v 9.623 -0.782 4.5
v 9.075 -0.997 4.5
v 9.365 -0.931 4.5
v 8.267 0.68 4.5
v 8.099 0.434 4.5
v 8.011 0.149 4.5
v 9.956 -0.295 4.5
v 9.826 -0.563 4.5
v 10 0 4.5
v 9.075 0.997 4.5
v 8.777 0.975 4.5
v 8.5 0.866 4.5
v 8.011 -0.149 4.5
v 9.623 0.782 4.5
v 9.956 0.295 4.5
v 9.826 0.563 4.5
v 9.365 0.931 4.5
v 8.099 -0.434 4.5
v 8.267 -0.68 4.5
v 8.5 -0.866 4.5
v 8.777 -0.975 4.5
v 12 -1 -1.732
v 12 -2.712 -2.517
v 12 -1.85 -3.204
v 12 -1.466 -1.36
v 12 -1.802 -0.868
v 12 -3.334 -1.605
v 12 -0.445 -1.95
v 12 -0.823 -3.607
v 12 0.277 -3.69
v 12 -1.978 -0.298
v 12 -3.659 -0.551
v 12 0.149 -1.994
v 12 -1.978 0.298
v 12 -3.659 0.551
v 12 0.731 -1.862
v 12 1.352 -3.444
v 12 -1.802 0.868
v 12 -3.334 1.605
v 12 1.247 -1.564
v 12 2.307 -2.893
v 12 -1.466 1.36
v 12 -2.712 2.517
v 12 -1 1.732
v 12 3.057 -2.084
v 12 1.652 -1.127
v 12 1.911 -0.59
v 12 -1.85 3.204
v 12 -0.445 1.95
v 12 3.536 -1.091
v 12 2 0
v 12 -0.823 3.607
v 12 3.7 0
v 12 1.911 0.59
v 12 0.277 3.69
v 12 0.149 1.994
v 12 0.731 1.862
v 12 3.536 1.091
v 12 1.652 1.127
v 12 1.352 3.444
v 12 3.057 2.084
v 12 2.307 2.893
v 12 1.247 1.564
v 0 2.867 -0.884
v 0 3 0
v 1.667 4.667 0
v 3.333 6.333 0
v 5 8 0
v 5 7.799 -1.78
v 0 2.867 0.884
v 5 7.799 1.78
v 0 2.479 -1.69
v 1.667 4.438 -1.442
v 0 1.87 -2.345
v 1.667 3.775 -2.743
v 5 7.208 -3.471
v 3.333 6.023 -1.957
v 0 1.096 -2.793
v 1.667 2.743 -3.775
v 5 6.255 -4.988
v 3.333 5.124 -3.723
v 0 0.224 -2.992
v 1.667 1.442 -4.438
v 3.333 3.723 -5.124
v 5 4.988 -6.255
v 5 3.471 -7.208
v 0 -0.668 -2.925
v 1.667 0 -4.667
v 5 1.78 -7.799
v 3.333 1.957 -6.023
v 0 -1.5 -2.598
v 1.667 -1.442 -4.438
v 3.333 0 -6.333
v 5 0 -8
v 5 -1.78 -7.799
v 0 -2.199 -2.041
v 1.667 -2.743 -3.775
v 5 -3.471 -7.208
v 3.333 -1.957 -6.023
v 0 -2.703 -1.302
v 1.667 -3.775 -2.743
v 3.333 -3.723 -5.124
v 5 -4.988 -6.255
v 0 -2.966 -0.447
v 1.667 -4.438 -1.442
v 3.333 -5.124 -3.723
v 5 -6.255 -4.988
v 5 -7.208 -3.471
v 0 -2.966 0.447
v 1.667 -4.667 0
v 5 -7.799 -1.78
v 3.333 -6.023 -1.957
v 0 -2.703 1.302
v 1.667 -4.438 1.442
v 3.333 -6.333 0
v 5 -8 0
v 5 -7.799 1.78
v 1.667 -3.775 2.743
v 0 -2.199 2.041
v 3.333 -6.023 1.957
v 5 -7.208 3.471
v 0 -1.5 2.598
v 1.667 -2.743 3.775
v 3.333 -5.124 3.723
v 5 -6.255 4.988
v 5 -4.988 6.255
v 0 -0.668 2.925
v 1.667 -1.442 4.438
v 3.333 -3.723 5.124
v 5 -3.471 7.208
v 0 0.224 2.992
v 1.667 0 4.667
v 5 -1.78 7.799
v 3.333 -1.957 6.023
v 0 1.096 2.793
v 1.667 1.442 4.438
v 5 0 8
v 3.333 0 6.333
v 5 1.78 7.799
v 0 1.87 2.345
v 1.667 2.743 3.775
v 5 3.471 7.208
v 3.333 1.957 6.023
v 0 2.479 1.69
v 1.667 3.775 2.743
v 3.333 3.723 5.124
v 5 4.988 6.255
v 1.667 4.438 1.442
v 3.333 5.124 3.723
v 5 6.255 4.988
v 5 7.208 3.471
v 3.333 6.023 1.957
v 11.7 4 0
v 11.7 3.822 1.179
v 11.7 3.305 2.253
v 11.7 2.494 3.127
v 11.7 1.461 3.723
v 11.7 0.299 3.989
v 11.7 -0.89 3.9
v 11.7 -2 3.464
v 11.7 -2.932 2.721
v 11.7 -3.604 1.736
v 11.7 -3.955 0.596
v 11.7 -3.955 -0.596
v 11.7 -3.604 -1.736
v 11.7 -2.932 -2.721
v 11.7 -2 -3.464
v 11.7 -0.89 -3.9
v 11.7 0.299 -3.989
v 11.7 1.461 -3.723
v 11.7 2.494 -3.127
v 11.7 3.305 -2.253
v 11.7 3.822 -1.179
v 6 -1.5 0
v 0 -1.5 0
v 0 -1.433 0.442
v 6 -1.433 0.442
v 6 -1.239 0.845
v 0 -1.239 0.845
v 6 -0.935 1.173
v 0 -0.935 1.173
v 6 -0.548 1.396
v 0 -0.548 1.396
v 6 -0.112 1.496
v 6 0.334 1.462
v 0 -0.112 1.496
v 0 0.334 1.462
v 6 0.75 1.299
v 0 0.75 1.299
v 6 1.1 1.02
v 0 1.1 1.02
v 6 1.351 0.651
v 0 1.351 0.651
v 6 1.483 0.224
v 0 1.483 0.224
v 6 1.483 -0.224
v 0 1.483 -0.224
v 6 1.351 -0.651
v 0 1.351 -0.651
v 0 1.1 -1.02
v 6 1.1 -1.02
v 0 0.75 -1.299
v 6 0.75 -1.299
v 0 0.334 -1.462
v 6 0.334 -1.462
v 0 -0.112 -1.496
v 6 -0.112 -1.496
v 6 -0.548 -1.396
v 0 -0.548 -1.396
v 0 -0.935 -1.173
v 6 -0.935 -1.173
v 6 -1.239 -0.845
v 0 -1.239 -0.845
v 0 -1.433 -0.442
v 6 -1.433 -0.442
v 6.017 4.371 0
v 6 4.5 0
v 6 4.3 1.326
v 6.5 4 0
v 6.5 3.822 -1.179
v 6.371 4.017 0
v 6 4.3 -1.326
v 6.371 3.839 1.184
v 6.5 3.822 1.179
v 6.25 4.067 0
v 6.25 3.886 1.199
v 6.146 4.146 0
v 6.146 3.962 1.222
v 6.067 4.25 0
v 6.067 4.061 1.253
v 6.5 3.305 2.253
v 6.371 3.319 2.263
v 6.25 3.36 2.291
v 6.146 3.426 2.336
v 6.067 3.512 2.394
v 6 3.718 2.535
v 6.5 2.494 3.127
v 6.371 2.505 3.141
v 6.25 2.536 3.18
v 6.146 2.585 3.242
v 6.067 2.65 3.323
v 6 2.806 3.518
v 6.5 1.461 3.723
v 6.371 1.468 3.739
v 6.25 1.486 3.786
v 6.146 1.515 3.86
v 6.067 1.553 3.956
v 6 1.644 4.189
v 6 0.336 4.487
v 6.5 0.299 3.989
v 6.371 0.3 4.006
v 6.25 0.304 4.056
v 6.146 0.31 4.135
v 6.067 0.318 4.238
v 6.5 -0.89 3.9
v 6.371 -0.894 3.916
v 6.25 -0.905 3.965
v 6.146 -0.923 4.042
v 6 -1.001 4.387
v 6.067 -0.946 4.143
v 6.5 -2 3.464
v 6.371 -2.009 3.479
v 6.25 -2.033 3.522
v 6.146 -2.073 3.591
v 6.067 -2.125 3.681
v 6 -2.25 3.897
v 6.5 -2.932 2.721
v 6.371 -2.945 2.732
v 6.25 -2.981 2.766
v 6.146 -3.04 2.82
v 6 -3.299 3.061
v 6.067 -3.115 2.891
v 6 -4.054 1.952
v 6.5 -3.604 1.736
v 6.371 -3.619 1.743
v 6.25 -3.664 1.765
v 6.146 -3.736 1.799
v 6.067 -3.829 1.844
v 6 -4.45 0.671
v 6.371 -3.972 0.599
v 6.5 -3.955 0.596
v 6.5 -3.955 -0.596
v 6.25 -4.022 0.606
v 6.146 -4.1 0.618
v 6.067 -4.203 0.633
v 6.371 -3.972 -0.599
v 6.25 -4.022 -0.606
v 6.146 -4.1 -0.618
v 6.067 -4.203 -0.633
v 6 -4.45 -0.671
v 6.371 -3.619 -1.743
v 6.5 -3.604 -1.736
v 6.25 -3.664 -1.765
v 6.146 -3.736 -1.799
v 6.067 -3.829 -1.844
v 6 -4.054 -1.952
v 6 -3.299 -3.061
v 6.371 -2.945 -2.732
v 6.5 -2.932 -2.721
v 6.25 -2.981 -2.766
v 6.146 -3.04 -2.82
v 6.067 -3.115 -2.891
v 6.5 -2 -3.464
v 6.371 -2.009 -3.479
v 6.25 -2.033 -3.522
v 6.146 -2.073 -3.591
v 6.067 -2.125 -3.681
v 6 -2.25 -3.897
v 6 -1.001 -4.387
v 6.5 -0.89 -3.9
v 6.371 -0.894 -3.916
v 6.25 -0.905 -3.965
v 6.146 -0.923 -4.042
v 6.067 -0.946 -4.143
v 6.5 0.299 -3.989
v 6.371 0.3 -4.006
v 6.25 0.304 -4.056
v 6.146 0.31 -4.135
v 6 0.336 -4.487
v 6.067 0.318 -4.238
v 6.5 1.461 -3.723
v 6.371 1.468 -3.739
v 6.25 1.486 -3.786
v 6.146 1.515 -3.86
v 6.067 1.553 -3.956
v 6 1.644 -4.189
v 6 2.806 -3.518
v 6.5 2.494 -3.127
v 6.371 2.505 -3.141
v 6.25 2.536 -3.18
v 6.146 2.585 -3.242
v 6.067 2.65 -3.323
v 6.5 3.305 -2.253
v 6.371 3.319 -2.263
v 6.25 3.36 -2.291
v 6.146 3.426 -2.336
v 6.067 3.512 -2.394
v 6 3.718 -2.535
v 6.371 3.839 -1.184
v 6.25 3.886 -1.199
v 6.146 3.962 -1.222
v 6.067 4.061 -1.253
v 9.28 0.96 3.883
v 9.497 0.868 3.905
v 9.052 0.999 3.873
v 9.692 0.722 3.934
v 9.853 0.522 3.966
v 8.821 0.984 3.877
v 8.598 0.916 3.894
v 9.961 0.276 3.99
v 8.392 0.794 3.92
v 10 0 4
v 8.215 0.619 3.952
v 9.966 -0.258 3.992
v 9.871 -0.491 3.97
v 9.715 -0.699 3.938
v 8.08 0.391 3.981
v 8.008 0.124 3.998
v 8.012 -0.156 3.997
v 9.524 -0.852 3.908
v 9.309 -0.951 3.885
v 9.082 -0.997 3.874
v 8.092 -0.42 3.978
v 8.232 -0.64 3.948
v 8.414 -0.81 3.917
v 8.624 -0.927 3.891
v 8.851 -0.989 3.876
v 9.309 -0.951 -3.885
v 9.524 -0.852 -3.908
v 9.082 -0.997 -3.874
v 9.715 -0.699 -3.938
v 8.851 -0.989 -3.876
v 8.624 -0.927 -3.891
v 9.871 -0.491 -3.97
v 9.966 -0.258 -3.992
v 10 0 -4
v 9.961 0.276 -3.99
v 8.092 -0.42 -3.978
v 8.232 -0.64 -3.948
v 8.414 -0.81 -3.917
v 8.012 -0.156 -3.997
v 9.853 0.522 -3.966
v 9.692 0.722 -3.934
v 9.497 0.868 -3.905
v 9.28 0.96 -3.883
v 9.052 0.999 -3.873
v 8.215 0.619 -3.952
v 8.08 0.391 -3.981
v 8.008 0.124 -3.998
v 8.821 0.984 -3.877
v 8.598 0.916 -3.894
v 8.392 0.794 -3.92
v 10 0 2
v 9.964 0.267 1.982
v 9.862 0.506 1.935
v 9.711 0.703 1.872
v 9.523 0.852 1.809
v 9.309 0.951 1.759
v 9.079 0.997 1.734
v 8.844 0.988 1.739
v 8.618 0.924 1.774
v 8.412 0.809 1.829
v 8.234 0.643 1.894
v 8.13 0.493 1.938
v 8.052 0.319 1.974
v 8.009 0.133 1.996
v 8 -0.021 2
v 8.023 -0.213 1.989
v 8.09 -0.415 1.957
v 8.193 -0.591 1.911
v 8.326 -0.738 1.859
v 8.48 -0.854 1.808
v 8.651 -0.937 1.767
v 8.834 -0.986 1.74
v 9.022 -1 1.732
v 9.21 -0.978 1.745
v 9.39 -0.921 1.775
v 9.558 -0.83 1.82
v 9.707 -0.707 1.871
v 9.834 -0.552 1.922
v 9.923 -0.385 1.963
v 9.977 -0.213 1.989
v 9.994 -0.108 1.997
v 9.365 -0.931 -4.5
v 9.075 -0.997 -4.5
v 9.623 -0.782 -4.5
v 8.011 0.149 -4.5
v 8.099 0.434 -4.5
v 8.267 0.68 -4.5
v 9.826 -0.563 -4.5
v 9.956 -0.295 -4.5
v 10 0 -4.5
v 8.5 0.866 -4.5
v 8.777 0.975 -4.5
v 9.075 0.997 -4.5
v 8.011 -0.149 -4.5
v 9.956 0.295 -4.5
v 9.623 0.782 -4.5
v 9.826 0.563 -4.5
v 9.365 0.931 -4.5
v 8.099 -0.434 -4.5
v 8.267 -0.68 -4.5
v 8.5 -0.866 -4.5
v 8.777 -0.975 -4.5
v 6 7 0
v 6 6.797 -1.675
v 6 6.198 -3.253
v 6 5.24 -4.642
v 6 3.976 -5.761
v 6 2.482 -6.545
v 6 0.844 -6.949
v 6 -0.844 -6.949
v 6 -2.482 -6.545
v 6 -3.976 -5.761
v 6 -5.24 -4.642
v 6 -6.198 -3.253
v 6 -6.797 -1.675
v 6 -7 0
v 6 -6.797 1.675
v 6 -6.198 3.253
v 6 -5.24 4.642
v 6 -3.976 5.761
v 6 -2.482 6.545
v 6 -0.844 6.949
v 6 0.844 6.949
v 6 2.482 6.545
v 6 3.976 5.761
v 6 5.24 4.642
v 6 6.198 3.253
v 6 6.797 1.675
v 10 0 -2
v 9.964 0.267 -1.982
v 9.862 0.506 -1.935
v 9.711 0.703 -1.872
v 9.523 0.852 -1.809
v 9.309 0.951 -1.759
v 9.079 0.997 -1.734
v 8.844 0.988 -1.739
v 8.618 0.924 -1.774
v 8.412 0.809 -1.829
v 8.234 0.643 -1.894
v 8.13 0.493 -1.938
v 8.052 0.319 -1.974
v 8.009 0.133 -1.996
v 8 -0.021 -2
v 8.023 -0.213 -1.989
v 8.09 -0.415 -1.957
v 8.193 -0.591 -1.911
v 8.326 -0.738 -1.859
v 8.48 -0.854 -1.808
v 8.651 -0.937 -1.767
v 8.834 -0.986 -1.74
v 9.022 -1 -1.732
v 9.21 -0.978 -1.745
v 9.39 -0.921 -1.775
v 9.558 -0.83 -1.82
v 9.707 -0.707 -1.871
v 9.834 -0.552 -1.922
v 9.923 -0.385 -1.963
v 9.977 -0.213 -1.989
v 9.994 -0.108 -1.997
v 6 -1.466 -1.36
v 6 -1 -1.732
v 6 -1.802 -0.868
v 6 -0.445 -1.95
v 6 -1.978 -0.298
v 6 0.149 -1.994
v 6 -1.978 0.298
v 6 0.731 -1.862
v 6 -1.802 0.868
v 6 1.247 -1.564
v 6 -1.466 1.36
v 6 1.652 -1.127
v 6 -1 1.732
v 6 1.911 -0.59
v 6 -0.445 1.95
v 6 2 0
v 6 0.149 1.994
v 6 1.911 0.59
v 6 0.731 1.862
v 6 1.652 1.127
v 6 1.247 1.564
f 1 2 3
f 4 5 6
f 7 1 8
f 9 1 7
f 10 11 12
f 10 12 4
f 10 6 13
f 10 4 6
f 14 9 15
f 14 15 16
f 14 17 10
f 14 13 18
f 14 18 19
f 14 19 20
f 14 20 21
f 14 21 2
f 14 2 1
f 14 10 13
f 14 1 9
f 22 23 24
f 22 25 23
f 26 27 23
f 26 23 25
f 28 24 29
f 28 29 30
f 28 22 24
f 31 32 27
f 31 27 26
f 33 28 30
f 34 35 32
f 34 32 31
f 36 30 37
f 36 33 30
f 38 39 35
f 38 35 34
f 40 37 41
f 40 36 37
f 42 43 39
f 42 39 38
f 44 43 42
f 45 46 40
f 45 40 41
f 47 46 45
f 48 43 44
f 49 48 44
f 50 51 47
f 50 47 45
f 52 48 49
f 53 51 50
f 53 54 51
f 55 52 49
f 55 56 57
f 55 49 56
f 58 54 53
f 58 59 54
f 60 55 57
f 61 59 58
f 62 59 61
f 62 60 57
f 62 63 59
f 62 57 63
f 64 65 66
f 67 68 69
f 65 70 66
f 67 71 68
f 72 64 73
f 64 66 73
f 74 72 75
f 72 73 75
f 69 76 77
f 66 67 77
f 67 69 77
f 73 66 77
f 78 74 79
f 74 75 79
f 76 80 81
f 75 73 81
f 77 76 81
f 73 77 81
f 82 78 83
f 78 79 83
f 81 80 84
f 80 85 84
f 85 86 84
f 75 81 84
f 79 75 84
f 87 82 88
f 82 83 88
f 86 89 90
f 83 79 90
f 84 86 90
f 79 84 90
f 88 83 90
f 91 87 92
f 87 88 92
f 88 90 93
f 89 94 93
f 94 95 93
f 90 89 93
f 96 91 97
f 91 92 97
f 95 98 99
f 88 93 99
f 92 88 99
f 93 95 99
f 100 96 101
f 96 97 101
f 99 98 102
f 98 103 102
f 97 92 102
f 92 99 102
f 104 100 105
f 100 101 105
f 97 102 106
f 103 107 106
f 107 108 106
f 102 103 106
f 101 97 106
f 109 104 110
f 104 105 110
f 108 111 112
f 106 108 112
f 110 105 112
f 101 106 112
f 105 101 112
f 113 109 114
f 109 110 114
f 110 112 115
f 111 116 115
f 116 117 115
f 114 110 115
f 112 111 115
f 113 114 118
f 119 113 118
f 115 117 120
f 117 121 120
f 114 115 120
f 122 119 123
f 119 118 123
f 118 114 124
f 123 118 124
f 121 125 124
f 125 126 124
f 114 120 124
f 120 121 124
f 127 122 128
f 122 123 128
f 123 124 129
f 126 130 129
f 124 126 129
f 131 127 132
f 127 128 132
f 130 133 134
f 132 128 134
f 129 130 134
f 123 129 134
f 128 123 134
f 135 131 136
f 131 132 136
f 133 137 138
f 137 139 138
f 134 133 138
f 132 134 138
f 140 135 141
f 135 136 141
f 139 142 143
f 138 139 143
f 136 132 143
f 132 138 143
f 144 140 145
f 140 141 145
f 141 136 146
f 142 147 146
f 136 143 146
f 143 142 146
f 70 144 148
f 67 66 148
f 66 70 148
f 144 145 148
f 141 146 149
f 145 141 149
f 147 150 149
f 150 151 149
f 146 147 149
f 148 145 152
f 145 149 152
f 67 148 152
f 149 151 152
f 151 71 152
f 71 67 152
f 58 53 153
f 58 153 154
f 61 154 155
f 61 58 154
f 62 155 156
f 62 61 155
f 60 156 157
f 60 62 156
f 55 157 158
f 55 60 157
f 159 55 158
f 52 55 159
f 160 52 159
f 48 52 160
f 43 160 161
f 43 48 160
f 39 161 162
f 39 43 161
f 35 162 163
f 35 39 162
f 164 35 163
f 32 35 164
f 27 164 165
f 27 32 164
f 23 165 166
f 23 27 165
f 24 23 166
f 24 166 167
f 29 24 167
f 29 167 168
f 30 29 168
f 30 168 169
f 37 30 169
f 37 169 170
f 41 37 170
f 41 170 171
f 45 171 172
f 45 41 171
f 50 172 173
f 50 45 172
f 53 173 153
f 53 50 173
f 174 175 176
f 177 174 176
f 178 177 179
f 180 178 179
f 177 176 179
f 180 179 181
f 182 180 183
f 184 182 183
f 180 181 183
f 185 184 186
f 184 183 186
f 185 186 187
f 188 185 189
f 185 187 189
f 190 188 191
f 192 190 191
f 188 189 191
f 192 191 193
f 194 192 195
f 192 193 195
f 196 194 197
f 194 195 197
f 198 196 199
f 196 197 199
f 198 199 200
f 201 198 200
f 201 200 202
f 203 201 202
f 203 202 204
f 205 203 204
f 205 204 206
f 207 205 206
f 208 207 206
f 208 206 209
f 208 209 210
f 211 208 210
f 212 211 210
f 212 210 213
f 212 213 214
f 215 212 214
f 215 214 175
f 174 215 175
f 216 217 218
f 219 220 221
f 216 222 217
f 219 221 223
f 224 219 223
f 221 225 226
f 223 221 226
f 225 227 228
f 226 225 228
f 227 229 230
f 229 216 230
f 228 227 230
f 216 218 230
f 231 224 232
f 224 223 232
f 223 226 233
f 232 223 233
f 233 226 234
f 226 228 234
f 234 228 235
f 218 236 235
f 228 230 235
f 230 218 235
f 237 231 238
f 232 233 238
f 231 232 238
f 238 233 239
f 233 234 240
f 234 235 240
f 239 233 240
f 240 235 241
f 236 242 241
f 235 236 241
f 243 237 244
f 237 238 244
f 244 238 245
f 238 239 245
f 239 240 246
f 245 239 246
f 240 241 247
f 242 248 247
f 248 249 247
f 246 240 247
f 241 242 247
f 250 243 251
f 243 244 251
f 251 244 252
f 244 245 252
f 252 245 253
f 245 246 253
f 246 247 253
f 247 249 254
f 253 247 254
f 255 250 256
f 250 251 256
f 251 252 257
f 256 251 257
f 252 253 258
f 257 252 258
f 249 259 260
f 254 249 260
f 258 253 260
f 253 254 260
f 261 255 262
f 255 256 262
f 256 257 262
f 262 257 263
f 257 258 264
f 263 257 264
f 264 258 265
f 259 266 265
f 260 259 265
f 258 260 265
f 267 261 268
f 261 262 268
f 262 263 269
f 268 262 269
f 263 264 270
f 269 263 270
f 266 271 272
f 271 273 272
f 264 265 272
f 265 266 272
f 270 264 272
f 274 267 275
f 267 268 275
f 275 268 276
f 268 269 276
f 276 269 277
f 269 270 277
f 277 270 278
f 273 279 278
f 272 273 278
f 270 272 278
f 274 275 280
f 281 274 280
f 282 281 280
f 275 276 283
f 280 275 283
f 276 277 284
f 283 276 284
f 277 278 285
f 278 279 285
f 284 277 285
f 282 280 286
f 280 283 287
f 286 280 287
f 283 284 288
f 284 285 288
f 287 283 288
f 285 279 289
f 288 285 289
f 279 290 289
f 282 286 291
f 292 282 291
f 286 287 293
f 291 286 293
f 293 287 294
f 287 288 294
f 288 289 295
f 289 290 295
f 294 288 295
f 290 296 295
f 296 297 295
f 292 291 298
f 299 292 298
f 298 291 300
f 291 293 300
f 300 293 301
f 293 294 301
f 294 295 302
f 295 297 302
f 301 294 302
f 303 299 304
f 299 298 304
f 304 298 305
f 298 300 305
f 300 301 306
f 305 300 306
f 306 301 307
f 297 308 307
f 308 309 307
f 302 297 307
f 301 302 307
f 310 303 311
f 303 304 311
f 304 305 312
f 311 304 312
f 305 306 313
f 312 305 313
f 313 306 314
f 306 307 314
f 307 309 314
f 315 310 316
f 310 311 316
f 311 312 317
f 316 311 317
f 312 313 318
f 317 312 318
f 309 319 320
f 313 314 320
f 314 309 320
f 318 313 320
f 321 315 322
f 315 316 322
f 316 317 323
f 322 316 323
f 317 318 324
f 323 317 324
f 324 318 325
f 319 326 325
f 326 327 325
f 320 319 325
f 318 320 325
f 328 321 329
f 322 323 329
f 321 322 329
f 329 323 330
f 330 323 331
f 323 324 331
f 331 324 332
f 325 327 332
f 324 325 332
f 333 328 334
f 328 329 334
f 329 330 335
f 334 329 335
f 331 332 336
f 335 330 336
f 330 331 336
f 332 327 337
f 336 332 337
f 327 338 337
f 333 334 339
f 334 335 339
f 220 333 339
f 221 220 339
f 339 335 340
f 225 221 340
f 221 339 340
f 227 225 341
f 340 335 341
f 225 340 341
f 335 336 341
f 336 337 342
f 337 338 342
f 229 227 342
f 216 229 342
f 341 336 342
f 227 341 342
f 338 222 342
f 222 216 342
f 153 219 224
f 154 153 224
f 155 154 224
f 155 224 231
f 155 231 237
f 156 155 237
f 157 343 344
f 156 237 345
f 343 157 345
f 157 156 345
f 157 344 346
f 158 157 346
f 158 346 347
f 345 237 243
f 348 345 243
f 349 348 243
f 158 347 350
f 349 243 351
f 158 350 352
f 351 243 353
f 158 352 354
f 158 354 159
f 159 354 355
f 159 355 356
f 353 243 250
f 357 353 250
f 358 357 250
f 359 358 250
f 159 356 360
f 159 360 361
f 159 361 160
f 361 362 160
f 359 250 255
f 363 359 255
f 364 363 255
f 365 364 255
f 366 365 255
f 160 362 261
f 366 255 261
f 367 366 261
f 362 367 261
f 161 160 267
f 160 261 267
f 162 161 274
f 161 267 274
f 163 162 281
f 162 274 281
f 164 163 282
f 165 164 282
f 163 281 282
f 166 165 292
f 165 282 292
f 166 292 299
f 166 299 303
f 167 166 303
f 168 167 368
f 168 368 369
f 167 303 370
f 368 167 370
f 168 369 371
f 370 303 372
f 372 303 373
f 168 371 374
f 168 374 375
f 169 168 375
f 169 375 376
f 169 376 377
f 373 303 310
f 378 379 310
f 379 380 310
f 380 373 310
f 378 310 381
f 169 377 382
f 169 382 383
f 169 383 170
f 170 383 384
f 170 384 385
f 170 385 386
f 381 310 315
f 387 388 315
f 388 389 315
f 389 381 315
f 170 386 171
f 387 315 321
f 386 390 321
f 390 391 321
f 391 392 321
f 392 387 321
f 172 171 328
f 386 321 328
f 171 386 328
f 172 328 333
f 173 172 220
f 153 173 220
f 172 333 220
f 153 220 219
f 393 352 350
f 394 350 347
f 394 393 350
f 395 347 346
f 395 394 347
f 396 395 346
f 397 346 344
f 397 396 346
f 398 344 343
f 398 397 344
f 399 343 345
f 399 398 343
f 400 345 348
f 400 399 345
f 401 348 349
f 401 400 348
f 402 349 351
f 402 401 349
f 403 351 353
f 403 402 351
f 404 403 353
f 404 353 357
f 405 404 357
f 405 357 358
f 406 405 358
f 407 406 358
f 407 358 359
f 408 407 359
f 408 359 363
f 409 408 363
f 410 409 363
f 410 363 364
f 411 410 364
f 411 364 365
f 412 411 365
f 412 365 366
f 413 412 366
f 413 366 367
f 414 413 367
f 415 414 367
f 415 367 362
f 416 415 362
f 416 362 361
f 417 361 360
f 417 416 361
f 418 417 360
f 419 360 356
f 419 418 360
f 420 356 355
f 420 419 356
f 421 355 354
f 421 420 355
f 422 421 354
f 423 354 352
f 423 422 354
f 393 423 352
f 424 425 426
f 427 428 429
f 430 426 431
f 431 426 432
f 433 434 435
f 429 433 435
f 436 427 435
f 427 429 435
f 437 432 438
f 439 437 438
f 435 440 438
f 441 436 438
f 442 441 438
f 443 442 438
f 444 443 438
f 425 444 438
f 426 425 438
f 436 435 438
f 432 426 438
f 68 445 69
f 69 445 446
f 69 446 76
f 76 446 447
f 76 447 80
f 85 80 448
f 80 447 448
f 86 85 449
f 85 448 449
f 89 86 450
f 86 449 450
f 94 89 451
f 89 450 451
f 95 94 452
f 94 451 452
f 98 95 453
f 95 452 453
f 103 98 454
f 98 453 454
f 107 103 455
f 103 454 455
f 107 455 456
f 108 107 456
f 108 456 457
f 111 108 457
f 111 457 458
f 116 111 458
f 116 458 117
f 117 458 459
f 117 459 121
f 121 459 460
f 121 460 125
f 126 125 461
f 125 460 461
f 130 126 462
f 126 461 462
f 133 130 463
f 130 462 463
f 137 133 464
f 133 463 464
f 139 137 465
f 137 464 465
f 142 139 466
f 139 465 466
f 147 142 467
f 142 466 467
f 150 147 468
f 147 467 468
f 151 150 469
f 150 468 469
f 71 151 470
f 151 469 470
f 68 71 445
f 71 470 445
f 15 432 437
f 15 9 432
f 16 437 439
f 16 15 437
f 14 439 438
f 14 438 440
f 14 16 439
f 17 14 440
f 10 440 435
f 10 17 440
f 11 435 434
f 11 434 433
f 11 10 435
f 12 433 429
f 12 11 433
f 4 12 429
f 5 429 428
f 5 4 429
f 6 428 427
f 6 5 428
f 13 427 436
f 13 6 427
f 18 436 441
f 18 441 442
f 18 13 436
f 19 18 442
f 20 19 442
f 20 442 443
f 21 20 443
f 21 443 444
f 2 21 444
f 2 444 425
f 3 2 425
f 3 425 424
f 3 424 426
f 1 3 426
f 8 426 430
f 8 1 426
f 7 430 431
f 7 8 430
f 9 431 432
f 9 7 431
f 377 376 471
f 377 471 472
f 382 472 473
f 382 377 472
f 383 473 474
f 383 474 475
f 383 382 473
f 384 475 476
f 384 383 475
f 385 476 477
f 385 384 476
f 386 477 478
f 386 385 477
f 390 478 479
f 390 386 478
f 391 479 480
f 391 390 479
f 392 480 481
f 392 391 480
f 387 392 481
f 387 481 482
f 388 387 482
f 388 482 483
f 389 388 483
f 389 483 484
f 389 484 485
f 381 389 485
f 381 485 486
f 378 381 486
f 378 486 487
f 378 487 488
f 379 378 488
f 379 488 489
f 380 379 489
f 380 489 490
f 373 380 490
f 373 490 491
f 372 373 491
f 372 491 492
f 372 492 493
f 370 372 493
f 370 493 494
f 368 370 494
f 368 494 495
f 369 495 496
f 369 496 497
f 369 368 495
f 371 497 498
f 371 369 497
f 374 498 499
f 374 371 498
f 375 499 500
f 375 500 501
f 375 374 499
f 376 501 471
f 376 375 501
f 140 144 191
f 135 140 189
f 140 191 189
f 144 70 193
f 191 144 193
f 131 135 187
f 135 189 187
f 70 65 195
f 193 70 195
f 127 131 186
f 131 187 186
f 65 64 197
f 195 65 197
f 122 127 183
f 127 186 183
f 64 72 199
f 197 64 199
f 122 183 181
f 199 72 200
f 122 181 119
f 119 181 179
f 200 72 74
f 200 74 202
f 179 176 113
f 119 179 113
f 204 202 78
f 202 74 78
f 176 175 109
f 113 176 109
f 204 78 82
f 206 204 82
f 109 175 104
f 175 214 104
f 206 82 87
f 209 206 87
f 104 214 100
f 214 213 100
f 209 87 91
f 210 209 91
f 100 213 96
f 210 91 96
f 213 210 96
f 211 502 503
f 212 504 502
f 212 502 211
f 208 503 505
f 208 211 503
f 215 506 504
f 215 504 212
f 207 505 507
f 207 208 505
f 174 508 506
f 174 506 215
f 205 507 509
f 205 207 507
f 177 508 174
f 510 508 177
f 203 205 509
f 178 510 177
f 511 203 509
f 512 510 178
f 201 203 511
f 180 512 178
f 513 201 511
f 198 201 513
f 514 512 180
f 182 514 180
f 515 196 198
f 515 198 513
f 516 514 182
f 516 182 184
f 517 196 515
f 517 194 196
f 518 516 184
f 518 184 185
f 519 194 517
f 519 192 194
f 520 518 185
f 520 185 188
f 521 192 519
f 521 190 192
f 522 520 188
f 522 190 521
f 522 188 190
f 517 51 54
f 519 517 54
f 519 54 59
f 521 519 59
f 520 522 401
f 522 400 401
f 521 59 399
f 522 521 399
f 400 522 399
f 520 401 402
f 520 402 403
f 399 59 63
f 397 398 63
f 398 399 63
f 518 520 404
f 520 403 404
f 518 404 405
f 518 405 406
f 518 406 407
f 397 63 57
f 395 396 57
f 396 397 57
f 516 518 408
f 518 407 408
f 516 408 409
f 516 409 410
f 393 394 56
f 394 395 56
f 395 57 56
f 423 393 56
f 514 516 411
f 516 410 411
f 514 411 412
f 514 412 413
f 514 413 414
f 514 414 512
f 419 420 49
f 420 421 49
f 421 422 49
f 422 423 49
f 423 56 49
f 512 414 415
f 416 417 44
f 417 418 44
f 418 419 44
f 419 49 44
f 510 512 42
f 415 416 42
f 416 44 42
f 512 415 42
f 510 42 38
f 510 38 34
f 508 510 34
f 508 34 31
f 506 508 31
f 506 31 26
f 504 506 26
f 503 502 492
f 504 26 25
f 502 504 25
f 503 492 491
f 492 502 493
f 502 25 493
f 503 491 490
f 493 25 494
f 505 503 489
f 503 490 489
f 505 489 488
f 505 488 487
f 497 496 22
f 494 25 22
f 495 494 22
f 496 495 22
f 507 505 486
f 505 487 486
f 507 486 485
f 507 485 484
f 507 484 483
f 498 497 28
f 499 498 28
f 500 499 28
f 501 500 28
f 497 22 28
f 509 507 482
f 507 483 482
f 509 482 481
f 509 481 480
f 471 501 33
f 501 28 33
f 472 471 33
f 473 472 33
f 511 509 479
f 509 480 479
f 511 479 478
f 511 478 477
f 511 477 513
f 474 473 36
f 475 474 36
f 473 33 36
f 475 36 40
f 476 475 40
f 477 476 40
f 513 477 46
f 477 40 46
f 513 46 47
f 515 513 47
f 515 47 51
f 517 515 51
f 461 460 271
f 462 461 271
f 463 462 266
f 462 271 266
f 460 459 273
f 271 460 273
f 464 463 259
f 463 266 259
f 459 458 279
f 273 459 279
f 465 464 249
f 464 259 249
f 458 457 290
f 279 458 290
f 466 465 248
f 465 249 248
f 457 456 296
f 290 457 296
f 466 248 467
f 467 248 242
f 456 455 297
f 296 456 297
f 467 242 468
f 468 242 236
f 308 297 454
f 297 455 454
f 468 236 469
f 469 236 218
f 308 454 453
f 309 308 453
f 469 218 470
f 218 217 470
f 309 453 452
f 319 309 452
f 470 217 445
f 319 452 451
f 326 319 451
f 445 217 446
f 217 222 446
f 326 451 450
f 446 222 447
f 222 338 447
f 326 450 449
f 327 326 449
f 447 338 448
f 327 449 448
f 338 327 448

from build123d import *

# Parameters (mm, degrees)
SKETCH2_R               = 1.5
CUT_EXTRUDE1_DEPTH      = 10
SKETCH3_R               = 4
BOSS_EXTRUDE1_DEPTH     = 6
SKETCH4_R               = 2
CUT_EXTRUDE2_DEPTH      = 6
CUT_EXTRUDE3_DEPTH      = 17.492422502
CUT_EXTRUDE3_DEPTH_BACK = 17.492422502
SKETCH5_R               = 1
FILLET1_R               = 0.5
CHAMFER1_SIZE           = 0.3
SKETCH6_R               = 1
BOSS_EXTRUDE2_DEPTH     = 4.5


with BuildPart() as part:
    # Sketch1 → Revolve1 (revolve)
    with BuildSketch(Plane.XY):
        Polygon((0, 0), (0, 3), (5, 8), (6, 7), (6, 0), align=None)
    revolve(axis=Axis((6, 0, 0), (-1, 0, 0)))

    # Sketch2 → Cut-Extrude1 (cut)
    with BuildSketch(Plane.ZY):
        with Locations(Location((0, 0, 0), (0, 0, 270))):
            Circle(SKETCH2_R)
    extrude(amount=-CUT_EXTRUDE1_DEPTH, mode=Mode.SUBTRACT)

    # Sketch3 → Boss-Extrude1 (add)
    with BuildSketch(Plane(origin=(6, 0, 0), x_dir=(0, 0, -1), z_dir=(1, 0, 0))):
        with Locations(Location((0, 0, 0), (0, 0, 90))):
            Circle(SKETCH3_R)
    extrude(amount=BOSS_EXTRUDE1_DEPTH)

    # Sketch4 → Cut-Extrude2 (cut)
    with BuildSketch(Plane(origin=(12, 0, 0), x_dir=(0, 0, -1), z_dir=(1, 0, 0))):
        with Locations(Location((0, 0, 0), (0, 0, 90))):
            Circle(SKETCH4_R)
    extrude(amount=-CUT_EXTRUDE2_DEPTH, mode=Mode.SUBTRACT)

    # Sketch5 → Cut-Extrude3 (cut, two sides: drawn at the far end of the back side and taken through both)
    with BuildSketch(Plane.XY.offset(-CUT_EXTRUDE3_DEPTH_BACK)):
        with Locations((9, 0)):
            Circle(SKETCH5_R)
    extrude(amount=CUT_EXTRUDE3_DEPTH + CUT_EXTRUDE3_DEPTH_BACK, mode=Mode.SUBTRACT)

    # Fillet1
    fillet1_edges = [part.edges().sort_by_distance(p)[0] for p in [
        (6, -4, 0),
    ]]
    fillet(fillet1_edges, radius=FILLET1_R)

    # Chamfer1
    chamfer1_edges = [part.edges().sort_by_distance(p)[0] for p in [
        (12, -4, 0),
    ]]
    chamfer(chamfer1_edges, length=CHAMFER1_SIZE)


with BuildPart() as body_2:
    # Sketch6 → Boss-Extrude2 (new, symmetric)
    with BuildSketch(Plane.XY):
        with Locations((9, 0)):
            Circle(SKETCH6_R)
    extrude(amount=BOSS_EXTRUDE2_DEPTH, both=True)


solid = Compound([part.part, body_2.part])
